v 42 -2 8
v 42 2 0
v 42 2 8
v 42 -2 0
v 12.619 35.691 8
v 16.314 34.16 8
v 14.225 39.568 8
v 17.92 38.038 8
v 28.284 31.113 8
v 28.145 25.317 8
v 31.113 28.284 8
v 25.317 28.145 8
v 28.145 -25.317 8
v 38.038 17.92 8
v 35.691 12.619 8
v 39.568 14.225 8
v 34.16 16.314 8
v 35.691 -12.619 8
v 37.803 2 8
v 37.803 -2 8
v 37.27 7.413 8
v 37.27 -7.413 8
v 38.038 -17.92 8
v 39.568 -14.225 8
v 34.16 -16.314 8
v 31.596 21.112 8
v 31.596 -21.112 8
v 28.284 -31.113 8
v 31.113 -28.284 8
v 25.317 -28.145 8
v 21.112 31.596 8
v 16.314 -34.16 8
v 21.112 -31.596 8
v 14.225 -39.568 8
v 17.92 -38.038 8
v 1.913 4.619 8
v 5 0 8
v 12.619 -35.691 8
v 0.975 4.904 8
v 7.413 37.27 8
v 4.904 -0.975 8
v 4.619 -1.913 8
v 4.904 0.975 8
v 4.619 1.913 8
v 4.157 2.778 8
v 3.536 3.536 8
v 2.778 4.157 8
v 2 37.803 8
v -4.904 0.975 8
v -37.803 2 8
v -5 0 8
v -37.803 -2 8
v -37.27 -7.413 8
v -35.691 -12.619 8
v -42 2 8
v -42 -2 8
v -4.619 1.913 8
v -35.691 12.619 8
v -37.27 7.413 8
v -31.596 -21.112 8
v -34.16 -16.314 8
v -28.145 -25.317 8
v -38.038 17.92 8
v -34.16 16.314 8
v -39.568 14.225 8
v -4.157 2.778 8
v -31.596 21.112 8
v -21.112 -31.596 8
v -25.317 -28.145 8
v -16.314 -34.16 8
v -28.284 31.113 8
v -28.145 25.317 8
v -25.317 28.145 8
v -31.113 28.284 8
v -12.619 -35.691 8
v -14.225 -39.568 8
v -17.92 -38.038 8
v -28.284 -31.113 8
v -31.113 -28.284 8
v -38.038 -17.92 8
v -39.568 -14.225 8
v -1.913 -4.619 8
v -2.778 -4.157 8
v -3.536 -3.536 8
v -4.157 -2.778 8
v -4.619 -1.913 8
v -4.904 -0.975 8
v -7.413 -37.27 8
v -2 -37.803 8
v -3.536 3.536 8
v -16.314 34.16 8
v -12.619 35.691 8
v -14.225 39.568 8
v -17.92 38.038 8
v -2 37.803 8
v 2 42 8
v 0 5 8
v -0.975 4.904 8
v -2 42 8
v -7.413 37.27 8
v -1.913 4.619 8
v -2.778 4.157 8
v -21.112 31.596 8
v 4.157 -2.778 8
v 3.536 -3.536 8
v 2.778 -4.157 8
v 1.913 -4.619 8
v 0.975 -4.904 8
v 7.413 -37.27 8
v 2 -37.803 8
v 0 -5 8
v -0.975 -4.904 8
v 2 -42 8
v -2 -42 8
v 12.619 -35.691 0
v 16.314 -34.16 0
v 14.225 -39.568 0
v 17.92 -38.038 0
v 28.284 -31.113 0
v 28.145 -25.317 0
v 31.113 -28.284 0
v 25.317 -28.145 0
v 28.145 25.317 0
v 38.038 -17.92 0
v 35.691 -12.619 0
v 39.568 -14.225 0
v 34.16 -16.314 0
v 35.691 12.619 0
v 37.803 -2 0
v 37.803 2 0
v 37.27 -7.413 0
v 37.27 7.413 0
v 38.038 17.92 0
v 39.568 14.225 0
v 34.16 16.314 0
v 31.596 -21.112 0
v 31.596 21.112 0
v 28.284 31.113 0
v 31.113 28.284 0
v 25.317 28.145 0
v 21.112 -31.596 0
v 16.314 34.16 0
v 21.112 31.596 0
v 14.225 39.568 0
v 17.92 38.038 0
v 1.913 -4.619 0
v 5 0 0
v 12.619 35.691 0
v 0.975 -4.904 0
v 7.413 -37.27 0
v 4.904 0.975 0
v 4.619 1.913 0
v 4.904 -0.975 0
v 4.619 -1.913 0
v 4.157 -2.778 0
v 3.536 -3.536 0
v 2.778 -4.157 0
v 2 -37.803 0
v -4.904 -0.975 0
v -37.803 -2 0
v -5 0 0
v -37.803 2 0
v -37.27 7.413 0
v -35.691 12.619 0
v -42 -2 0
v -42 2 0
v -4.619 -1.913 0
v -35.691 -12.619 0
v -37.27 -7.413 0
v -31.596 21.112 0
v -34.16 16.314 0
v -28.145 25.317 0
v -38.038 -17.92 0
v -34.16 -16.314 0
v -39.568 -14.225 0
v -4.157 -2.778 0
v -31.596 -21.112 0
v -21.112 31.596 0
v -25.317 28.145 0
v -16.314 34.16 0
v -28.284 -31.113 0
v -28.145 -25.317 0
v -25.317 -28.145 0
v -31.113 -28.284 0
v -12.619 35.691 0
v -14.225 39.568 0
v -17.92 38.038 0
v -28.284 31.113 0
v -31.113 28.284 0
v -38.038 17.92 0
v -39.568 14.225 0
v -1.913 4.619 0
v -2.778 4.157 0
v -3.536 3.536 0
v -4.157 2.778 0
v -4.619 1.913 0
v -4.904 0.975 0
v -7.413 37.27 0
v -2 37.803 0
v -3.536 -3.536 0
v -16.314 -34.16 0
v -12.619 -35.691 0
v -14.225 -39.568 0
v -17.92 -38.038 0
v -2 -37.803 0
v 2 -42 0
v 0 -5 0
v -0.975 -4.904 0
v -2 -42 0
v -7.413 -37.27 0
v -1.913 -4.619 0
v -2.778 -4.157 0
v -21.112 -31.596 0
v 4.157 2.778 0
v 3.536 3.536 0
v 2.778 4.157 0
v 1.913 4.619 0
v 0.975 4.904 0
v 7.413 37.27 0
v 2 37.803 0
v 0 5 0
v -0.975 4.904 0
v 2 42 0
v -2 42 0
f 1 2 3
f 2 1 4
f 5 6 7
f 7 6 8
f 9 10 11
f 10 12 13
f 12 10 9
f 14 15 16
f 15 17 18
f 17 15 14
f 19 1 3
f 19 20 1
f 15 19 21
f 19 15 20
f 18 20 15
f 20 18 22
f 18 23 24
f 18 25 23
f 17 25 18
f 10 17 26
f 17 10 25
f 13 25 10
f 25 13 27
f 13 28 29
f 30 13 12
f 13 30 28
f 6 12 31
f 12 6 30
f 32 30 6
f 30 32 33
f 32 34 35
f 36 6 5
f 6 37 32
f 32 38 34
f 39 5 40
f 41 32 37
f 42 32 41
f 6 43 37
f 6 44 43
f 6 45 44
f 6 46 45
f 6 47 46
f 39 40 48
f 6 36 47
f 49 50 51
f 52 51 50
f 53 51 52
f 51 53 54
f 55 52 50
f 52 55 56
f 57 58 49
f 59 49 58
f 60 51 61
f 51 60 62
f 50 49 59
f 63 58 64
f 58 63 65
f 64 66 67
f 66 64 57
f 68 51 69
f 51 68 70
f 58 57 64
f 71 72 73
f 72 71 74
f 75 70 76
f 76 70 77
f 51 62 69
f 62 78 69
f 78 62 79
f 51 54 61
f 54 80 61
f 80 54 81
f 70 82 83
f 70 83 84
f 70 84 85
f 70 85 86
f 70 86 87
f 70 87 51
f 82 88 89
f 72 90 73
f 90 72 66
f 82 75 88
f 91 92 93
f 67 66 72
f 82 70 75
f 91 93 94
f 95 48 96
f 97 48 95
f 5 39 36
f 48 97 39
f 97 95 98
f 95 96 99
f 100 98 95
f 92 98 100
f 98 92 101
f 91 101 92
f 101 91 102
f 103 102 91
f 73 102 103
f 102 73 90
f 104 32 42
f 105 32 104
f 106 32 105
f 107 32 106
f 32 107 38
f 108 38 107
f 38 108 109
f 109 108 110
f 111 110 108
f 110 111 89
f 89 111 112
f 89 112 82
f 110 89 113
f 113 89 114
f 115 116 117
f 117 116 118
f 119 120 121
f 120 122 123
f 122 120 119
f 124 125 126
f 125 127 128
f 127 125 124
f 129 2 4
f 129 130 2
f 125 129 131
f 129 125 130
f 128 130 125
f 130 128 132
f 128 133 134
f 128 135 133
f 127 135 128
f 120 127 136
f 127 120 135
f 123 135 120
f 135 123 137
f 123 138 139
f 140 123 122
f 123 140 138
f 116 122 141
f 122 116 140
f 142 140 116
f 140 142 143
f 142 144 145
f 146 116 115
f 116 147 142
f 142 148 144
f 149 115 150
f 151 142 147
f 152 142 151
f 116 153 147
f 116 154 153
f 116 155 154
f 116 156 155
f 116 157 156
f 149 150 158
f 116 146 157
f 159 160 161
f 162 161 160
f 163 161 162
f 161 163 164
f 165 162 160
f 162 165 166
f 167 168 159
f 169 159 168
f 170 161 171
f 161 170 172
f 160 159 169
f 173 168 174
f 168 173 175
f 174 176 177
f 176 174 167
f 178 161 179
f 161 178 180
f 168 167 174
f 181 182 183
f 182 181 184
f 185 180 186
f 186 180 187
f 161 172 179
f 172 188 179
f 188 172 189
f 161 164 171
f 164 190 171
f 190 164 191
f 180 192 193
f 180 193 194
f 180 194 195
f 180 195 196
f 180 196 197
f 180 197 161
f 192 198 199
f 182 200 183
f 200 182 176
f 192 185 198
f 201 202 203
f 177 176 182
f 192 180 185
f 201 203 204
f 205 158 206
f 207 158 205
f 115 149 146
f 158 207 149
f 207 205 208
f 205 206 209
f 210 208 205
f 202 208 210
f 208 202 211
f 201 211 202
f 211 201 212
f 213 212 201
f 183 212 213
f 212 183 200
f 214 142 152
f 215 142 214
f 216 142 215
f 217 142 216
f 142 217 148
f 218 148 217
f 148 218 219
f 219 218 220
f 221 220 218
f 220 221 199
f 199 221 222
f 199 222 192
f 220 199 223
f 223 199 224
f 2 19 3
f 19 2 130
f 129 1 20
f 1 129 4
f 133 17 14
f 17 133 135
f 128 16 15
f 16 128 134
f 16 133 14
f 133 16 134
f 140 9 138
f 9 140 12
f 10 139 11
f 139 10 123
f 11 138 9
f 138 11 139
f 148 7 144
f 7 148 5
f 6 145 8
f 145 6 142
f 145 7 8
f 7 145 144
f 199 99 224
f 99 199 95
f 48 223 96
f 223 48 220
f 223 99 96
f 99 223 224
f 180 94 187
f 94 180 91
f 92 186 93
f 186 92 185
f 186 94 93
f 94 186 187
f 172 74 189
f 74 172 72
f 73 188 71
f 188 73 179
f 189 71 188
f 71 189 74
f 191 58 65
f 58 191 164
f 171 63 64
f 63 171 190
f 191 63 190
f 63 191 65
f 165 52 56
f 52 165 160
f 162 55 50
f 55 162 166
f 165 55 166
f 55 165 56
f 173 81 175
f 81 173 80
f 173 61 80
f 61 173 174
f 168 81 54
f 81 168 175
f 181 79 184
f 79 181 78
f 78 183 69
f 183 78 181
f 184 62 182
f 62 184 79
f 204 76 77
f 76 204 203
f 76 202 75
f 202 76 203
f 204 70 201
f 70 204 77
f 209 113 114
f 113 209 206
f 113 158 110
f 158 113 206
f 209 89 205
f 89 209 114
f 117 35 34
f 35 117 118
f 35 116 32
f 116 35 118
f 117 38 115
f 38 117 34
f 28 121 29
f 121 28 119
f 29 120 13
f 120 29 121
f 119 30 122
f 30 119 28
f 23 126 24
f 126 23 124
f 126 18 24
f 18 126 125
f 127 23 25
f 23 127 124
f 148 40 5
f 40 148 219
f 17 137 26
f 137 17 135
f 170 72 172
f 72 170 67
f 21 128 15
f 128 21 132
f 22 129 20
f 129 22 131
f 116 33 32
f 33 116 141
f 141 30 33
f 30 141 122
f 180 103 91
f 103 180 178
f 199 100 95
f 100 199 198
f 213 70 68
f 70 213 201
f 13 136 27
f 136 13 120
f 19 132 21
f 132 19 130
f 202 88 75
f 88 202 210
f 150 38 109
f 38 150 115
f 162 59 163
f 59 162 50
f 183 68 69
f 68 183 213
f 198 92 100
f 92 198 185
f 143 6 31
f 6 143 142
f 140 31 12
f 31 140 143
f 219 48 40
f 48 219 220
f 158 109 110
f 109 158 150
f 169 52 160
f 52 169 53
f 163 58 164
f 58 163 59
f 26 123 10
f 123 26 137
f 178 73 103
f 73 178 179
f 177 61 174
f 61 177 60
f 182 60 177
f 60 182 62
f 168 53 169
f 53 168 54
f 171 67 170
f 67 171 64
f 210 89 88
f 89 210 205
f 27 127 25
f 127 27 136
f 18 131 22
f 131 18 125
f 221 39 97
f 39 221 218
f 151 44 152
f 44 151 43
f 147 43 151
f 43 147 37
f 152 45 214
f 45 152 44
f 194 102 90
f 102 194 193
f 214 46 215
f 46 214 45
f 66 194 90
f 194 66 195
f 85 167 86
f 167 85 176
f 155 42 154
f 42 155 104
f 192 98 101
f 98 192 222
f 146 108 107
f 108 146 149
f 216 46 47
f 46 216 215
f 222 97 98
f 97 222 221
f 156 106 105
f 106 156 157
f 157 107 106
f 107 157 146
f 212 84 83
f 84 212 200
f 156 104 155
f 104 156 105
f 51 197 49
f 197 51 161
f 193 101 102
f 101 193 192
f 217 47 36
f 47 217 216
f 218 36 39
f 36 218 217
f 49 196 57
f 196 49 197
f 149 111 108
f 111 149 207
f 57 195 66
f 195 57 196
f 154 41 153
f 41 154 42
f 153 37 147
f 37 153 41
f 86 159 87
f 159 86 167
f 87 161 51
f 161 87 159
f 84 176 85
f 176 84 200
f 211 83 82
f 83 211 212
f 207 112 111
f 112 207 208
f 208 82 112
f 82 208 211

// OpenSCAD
$fn = 32;

// ----------------------------------------------------------------------
// Spur blank: bored gear blank
// ----------------------------------------------------------------------

// --- parameters (mm) ---
disc_r = 38;              // blank root radius
disc_t = 8;               // blank thickness
n_teeth = 16;             // stub tooth count
tooth_w = 4;              // tooth width at the root
tooth_h = 4;              // tooth height above the root
bore_r = 5;               // central bore radius

out_r = disc_r + tooth_h;  // tip radius
bbox_x = 84.0;  // measured width over the teeth
bbox_y = 84.0;  // measured depth over the teeth

difference() {
union() {
  cylinder(r = disc_r, h = disc_t);
  for (i = [0 : n_teeth - 1])
    rotate([0, 0, i * 360 / n_teeth])
      translate([disc_r - 1, -tooth_w / 2, 0])
        cube([tooth_h + 1, tooth_w, disc_t]);
}
  translate([0, 0, -1]) cylinder(r = bore_r, h = disc_t + 2);
}
